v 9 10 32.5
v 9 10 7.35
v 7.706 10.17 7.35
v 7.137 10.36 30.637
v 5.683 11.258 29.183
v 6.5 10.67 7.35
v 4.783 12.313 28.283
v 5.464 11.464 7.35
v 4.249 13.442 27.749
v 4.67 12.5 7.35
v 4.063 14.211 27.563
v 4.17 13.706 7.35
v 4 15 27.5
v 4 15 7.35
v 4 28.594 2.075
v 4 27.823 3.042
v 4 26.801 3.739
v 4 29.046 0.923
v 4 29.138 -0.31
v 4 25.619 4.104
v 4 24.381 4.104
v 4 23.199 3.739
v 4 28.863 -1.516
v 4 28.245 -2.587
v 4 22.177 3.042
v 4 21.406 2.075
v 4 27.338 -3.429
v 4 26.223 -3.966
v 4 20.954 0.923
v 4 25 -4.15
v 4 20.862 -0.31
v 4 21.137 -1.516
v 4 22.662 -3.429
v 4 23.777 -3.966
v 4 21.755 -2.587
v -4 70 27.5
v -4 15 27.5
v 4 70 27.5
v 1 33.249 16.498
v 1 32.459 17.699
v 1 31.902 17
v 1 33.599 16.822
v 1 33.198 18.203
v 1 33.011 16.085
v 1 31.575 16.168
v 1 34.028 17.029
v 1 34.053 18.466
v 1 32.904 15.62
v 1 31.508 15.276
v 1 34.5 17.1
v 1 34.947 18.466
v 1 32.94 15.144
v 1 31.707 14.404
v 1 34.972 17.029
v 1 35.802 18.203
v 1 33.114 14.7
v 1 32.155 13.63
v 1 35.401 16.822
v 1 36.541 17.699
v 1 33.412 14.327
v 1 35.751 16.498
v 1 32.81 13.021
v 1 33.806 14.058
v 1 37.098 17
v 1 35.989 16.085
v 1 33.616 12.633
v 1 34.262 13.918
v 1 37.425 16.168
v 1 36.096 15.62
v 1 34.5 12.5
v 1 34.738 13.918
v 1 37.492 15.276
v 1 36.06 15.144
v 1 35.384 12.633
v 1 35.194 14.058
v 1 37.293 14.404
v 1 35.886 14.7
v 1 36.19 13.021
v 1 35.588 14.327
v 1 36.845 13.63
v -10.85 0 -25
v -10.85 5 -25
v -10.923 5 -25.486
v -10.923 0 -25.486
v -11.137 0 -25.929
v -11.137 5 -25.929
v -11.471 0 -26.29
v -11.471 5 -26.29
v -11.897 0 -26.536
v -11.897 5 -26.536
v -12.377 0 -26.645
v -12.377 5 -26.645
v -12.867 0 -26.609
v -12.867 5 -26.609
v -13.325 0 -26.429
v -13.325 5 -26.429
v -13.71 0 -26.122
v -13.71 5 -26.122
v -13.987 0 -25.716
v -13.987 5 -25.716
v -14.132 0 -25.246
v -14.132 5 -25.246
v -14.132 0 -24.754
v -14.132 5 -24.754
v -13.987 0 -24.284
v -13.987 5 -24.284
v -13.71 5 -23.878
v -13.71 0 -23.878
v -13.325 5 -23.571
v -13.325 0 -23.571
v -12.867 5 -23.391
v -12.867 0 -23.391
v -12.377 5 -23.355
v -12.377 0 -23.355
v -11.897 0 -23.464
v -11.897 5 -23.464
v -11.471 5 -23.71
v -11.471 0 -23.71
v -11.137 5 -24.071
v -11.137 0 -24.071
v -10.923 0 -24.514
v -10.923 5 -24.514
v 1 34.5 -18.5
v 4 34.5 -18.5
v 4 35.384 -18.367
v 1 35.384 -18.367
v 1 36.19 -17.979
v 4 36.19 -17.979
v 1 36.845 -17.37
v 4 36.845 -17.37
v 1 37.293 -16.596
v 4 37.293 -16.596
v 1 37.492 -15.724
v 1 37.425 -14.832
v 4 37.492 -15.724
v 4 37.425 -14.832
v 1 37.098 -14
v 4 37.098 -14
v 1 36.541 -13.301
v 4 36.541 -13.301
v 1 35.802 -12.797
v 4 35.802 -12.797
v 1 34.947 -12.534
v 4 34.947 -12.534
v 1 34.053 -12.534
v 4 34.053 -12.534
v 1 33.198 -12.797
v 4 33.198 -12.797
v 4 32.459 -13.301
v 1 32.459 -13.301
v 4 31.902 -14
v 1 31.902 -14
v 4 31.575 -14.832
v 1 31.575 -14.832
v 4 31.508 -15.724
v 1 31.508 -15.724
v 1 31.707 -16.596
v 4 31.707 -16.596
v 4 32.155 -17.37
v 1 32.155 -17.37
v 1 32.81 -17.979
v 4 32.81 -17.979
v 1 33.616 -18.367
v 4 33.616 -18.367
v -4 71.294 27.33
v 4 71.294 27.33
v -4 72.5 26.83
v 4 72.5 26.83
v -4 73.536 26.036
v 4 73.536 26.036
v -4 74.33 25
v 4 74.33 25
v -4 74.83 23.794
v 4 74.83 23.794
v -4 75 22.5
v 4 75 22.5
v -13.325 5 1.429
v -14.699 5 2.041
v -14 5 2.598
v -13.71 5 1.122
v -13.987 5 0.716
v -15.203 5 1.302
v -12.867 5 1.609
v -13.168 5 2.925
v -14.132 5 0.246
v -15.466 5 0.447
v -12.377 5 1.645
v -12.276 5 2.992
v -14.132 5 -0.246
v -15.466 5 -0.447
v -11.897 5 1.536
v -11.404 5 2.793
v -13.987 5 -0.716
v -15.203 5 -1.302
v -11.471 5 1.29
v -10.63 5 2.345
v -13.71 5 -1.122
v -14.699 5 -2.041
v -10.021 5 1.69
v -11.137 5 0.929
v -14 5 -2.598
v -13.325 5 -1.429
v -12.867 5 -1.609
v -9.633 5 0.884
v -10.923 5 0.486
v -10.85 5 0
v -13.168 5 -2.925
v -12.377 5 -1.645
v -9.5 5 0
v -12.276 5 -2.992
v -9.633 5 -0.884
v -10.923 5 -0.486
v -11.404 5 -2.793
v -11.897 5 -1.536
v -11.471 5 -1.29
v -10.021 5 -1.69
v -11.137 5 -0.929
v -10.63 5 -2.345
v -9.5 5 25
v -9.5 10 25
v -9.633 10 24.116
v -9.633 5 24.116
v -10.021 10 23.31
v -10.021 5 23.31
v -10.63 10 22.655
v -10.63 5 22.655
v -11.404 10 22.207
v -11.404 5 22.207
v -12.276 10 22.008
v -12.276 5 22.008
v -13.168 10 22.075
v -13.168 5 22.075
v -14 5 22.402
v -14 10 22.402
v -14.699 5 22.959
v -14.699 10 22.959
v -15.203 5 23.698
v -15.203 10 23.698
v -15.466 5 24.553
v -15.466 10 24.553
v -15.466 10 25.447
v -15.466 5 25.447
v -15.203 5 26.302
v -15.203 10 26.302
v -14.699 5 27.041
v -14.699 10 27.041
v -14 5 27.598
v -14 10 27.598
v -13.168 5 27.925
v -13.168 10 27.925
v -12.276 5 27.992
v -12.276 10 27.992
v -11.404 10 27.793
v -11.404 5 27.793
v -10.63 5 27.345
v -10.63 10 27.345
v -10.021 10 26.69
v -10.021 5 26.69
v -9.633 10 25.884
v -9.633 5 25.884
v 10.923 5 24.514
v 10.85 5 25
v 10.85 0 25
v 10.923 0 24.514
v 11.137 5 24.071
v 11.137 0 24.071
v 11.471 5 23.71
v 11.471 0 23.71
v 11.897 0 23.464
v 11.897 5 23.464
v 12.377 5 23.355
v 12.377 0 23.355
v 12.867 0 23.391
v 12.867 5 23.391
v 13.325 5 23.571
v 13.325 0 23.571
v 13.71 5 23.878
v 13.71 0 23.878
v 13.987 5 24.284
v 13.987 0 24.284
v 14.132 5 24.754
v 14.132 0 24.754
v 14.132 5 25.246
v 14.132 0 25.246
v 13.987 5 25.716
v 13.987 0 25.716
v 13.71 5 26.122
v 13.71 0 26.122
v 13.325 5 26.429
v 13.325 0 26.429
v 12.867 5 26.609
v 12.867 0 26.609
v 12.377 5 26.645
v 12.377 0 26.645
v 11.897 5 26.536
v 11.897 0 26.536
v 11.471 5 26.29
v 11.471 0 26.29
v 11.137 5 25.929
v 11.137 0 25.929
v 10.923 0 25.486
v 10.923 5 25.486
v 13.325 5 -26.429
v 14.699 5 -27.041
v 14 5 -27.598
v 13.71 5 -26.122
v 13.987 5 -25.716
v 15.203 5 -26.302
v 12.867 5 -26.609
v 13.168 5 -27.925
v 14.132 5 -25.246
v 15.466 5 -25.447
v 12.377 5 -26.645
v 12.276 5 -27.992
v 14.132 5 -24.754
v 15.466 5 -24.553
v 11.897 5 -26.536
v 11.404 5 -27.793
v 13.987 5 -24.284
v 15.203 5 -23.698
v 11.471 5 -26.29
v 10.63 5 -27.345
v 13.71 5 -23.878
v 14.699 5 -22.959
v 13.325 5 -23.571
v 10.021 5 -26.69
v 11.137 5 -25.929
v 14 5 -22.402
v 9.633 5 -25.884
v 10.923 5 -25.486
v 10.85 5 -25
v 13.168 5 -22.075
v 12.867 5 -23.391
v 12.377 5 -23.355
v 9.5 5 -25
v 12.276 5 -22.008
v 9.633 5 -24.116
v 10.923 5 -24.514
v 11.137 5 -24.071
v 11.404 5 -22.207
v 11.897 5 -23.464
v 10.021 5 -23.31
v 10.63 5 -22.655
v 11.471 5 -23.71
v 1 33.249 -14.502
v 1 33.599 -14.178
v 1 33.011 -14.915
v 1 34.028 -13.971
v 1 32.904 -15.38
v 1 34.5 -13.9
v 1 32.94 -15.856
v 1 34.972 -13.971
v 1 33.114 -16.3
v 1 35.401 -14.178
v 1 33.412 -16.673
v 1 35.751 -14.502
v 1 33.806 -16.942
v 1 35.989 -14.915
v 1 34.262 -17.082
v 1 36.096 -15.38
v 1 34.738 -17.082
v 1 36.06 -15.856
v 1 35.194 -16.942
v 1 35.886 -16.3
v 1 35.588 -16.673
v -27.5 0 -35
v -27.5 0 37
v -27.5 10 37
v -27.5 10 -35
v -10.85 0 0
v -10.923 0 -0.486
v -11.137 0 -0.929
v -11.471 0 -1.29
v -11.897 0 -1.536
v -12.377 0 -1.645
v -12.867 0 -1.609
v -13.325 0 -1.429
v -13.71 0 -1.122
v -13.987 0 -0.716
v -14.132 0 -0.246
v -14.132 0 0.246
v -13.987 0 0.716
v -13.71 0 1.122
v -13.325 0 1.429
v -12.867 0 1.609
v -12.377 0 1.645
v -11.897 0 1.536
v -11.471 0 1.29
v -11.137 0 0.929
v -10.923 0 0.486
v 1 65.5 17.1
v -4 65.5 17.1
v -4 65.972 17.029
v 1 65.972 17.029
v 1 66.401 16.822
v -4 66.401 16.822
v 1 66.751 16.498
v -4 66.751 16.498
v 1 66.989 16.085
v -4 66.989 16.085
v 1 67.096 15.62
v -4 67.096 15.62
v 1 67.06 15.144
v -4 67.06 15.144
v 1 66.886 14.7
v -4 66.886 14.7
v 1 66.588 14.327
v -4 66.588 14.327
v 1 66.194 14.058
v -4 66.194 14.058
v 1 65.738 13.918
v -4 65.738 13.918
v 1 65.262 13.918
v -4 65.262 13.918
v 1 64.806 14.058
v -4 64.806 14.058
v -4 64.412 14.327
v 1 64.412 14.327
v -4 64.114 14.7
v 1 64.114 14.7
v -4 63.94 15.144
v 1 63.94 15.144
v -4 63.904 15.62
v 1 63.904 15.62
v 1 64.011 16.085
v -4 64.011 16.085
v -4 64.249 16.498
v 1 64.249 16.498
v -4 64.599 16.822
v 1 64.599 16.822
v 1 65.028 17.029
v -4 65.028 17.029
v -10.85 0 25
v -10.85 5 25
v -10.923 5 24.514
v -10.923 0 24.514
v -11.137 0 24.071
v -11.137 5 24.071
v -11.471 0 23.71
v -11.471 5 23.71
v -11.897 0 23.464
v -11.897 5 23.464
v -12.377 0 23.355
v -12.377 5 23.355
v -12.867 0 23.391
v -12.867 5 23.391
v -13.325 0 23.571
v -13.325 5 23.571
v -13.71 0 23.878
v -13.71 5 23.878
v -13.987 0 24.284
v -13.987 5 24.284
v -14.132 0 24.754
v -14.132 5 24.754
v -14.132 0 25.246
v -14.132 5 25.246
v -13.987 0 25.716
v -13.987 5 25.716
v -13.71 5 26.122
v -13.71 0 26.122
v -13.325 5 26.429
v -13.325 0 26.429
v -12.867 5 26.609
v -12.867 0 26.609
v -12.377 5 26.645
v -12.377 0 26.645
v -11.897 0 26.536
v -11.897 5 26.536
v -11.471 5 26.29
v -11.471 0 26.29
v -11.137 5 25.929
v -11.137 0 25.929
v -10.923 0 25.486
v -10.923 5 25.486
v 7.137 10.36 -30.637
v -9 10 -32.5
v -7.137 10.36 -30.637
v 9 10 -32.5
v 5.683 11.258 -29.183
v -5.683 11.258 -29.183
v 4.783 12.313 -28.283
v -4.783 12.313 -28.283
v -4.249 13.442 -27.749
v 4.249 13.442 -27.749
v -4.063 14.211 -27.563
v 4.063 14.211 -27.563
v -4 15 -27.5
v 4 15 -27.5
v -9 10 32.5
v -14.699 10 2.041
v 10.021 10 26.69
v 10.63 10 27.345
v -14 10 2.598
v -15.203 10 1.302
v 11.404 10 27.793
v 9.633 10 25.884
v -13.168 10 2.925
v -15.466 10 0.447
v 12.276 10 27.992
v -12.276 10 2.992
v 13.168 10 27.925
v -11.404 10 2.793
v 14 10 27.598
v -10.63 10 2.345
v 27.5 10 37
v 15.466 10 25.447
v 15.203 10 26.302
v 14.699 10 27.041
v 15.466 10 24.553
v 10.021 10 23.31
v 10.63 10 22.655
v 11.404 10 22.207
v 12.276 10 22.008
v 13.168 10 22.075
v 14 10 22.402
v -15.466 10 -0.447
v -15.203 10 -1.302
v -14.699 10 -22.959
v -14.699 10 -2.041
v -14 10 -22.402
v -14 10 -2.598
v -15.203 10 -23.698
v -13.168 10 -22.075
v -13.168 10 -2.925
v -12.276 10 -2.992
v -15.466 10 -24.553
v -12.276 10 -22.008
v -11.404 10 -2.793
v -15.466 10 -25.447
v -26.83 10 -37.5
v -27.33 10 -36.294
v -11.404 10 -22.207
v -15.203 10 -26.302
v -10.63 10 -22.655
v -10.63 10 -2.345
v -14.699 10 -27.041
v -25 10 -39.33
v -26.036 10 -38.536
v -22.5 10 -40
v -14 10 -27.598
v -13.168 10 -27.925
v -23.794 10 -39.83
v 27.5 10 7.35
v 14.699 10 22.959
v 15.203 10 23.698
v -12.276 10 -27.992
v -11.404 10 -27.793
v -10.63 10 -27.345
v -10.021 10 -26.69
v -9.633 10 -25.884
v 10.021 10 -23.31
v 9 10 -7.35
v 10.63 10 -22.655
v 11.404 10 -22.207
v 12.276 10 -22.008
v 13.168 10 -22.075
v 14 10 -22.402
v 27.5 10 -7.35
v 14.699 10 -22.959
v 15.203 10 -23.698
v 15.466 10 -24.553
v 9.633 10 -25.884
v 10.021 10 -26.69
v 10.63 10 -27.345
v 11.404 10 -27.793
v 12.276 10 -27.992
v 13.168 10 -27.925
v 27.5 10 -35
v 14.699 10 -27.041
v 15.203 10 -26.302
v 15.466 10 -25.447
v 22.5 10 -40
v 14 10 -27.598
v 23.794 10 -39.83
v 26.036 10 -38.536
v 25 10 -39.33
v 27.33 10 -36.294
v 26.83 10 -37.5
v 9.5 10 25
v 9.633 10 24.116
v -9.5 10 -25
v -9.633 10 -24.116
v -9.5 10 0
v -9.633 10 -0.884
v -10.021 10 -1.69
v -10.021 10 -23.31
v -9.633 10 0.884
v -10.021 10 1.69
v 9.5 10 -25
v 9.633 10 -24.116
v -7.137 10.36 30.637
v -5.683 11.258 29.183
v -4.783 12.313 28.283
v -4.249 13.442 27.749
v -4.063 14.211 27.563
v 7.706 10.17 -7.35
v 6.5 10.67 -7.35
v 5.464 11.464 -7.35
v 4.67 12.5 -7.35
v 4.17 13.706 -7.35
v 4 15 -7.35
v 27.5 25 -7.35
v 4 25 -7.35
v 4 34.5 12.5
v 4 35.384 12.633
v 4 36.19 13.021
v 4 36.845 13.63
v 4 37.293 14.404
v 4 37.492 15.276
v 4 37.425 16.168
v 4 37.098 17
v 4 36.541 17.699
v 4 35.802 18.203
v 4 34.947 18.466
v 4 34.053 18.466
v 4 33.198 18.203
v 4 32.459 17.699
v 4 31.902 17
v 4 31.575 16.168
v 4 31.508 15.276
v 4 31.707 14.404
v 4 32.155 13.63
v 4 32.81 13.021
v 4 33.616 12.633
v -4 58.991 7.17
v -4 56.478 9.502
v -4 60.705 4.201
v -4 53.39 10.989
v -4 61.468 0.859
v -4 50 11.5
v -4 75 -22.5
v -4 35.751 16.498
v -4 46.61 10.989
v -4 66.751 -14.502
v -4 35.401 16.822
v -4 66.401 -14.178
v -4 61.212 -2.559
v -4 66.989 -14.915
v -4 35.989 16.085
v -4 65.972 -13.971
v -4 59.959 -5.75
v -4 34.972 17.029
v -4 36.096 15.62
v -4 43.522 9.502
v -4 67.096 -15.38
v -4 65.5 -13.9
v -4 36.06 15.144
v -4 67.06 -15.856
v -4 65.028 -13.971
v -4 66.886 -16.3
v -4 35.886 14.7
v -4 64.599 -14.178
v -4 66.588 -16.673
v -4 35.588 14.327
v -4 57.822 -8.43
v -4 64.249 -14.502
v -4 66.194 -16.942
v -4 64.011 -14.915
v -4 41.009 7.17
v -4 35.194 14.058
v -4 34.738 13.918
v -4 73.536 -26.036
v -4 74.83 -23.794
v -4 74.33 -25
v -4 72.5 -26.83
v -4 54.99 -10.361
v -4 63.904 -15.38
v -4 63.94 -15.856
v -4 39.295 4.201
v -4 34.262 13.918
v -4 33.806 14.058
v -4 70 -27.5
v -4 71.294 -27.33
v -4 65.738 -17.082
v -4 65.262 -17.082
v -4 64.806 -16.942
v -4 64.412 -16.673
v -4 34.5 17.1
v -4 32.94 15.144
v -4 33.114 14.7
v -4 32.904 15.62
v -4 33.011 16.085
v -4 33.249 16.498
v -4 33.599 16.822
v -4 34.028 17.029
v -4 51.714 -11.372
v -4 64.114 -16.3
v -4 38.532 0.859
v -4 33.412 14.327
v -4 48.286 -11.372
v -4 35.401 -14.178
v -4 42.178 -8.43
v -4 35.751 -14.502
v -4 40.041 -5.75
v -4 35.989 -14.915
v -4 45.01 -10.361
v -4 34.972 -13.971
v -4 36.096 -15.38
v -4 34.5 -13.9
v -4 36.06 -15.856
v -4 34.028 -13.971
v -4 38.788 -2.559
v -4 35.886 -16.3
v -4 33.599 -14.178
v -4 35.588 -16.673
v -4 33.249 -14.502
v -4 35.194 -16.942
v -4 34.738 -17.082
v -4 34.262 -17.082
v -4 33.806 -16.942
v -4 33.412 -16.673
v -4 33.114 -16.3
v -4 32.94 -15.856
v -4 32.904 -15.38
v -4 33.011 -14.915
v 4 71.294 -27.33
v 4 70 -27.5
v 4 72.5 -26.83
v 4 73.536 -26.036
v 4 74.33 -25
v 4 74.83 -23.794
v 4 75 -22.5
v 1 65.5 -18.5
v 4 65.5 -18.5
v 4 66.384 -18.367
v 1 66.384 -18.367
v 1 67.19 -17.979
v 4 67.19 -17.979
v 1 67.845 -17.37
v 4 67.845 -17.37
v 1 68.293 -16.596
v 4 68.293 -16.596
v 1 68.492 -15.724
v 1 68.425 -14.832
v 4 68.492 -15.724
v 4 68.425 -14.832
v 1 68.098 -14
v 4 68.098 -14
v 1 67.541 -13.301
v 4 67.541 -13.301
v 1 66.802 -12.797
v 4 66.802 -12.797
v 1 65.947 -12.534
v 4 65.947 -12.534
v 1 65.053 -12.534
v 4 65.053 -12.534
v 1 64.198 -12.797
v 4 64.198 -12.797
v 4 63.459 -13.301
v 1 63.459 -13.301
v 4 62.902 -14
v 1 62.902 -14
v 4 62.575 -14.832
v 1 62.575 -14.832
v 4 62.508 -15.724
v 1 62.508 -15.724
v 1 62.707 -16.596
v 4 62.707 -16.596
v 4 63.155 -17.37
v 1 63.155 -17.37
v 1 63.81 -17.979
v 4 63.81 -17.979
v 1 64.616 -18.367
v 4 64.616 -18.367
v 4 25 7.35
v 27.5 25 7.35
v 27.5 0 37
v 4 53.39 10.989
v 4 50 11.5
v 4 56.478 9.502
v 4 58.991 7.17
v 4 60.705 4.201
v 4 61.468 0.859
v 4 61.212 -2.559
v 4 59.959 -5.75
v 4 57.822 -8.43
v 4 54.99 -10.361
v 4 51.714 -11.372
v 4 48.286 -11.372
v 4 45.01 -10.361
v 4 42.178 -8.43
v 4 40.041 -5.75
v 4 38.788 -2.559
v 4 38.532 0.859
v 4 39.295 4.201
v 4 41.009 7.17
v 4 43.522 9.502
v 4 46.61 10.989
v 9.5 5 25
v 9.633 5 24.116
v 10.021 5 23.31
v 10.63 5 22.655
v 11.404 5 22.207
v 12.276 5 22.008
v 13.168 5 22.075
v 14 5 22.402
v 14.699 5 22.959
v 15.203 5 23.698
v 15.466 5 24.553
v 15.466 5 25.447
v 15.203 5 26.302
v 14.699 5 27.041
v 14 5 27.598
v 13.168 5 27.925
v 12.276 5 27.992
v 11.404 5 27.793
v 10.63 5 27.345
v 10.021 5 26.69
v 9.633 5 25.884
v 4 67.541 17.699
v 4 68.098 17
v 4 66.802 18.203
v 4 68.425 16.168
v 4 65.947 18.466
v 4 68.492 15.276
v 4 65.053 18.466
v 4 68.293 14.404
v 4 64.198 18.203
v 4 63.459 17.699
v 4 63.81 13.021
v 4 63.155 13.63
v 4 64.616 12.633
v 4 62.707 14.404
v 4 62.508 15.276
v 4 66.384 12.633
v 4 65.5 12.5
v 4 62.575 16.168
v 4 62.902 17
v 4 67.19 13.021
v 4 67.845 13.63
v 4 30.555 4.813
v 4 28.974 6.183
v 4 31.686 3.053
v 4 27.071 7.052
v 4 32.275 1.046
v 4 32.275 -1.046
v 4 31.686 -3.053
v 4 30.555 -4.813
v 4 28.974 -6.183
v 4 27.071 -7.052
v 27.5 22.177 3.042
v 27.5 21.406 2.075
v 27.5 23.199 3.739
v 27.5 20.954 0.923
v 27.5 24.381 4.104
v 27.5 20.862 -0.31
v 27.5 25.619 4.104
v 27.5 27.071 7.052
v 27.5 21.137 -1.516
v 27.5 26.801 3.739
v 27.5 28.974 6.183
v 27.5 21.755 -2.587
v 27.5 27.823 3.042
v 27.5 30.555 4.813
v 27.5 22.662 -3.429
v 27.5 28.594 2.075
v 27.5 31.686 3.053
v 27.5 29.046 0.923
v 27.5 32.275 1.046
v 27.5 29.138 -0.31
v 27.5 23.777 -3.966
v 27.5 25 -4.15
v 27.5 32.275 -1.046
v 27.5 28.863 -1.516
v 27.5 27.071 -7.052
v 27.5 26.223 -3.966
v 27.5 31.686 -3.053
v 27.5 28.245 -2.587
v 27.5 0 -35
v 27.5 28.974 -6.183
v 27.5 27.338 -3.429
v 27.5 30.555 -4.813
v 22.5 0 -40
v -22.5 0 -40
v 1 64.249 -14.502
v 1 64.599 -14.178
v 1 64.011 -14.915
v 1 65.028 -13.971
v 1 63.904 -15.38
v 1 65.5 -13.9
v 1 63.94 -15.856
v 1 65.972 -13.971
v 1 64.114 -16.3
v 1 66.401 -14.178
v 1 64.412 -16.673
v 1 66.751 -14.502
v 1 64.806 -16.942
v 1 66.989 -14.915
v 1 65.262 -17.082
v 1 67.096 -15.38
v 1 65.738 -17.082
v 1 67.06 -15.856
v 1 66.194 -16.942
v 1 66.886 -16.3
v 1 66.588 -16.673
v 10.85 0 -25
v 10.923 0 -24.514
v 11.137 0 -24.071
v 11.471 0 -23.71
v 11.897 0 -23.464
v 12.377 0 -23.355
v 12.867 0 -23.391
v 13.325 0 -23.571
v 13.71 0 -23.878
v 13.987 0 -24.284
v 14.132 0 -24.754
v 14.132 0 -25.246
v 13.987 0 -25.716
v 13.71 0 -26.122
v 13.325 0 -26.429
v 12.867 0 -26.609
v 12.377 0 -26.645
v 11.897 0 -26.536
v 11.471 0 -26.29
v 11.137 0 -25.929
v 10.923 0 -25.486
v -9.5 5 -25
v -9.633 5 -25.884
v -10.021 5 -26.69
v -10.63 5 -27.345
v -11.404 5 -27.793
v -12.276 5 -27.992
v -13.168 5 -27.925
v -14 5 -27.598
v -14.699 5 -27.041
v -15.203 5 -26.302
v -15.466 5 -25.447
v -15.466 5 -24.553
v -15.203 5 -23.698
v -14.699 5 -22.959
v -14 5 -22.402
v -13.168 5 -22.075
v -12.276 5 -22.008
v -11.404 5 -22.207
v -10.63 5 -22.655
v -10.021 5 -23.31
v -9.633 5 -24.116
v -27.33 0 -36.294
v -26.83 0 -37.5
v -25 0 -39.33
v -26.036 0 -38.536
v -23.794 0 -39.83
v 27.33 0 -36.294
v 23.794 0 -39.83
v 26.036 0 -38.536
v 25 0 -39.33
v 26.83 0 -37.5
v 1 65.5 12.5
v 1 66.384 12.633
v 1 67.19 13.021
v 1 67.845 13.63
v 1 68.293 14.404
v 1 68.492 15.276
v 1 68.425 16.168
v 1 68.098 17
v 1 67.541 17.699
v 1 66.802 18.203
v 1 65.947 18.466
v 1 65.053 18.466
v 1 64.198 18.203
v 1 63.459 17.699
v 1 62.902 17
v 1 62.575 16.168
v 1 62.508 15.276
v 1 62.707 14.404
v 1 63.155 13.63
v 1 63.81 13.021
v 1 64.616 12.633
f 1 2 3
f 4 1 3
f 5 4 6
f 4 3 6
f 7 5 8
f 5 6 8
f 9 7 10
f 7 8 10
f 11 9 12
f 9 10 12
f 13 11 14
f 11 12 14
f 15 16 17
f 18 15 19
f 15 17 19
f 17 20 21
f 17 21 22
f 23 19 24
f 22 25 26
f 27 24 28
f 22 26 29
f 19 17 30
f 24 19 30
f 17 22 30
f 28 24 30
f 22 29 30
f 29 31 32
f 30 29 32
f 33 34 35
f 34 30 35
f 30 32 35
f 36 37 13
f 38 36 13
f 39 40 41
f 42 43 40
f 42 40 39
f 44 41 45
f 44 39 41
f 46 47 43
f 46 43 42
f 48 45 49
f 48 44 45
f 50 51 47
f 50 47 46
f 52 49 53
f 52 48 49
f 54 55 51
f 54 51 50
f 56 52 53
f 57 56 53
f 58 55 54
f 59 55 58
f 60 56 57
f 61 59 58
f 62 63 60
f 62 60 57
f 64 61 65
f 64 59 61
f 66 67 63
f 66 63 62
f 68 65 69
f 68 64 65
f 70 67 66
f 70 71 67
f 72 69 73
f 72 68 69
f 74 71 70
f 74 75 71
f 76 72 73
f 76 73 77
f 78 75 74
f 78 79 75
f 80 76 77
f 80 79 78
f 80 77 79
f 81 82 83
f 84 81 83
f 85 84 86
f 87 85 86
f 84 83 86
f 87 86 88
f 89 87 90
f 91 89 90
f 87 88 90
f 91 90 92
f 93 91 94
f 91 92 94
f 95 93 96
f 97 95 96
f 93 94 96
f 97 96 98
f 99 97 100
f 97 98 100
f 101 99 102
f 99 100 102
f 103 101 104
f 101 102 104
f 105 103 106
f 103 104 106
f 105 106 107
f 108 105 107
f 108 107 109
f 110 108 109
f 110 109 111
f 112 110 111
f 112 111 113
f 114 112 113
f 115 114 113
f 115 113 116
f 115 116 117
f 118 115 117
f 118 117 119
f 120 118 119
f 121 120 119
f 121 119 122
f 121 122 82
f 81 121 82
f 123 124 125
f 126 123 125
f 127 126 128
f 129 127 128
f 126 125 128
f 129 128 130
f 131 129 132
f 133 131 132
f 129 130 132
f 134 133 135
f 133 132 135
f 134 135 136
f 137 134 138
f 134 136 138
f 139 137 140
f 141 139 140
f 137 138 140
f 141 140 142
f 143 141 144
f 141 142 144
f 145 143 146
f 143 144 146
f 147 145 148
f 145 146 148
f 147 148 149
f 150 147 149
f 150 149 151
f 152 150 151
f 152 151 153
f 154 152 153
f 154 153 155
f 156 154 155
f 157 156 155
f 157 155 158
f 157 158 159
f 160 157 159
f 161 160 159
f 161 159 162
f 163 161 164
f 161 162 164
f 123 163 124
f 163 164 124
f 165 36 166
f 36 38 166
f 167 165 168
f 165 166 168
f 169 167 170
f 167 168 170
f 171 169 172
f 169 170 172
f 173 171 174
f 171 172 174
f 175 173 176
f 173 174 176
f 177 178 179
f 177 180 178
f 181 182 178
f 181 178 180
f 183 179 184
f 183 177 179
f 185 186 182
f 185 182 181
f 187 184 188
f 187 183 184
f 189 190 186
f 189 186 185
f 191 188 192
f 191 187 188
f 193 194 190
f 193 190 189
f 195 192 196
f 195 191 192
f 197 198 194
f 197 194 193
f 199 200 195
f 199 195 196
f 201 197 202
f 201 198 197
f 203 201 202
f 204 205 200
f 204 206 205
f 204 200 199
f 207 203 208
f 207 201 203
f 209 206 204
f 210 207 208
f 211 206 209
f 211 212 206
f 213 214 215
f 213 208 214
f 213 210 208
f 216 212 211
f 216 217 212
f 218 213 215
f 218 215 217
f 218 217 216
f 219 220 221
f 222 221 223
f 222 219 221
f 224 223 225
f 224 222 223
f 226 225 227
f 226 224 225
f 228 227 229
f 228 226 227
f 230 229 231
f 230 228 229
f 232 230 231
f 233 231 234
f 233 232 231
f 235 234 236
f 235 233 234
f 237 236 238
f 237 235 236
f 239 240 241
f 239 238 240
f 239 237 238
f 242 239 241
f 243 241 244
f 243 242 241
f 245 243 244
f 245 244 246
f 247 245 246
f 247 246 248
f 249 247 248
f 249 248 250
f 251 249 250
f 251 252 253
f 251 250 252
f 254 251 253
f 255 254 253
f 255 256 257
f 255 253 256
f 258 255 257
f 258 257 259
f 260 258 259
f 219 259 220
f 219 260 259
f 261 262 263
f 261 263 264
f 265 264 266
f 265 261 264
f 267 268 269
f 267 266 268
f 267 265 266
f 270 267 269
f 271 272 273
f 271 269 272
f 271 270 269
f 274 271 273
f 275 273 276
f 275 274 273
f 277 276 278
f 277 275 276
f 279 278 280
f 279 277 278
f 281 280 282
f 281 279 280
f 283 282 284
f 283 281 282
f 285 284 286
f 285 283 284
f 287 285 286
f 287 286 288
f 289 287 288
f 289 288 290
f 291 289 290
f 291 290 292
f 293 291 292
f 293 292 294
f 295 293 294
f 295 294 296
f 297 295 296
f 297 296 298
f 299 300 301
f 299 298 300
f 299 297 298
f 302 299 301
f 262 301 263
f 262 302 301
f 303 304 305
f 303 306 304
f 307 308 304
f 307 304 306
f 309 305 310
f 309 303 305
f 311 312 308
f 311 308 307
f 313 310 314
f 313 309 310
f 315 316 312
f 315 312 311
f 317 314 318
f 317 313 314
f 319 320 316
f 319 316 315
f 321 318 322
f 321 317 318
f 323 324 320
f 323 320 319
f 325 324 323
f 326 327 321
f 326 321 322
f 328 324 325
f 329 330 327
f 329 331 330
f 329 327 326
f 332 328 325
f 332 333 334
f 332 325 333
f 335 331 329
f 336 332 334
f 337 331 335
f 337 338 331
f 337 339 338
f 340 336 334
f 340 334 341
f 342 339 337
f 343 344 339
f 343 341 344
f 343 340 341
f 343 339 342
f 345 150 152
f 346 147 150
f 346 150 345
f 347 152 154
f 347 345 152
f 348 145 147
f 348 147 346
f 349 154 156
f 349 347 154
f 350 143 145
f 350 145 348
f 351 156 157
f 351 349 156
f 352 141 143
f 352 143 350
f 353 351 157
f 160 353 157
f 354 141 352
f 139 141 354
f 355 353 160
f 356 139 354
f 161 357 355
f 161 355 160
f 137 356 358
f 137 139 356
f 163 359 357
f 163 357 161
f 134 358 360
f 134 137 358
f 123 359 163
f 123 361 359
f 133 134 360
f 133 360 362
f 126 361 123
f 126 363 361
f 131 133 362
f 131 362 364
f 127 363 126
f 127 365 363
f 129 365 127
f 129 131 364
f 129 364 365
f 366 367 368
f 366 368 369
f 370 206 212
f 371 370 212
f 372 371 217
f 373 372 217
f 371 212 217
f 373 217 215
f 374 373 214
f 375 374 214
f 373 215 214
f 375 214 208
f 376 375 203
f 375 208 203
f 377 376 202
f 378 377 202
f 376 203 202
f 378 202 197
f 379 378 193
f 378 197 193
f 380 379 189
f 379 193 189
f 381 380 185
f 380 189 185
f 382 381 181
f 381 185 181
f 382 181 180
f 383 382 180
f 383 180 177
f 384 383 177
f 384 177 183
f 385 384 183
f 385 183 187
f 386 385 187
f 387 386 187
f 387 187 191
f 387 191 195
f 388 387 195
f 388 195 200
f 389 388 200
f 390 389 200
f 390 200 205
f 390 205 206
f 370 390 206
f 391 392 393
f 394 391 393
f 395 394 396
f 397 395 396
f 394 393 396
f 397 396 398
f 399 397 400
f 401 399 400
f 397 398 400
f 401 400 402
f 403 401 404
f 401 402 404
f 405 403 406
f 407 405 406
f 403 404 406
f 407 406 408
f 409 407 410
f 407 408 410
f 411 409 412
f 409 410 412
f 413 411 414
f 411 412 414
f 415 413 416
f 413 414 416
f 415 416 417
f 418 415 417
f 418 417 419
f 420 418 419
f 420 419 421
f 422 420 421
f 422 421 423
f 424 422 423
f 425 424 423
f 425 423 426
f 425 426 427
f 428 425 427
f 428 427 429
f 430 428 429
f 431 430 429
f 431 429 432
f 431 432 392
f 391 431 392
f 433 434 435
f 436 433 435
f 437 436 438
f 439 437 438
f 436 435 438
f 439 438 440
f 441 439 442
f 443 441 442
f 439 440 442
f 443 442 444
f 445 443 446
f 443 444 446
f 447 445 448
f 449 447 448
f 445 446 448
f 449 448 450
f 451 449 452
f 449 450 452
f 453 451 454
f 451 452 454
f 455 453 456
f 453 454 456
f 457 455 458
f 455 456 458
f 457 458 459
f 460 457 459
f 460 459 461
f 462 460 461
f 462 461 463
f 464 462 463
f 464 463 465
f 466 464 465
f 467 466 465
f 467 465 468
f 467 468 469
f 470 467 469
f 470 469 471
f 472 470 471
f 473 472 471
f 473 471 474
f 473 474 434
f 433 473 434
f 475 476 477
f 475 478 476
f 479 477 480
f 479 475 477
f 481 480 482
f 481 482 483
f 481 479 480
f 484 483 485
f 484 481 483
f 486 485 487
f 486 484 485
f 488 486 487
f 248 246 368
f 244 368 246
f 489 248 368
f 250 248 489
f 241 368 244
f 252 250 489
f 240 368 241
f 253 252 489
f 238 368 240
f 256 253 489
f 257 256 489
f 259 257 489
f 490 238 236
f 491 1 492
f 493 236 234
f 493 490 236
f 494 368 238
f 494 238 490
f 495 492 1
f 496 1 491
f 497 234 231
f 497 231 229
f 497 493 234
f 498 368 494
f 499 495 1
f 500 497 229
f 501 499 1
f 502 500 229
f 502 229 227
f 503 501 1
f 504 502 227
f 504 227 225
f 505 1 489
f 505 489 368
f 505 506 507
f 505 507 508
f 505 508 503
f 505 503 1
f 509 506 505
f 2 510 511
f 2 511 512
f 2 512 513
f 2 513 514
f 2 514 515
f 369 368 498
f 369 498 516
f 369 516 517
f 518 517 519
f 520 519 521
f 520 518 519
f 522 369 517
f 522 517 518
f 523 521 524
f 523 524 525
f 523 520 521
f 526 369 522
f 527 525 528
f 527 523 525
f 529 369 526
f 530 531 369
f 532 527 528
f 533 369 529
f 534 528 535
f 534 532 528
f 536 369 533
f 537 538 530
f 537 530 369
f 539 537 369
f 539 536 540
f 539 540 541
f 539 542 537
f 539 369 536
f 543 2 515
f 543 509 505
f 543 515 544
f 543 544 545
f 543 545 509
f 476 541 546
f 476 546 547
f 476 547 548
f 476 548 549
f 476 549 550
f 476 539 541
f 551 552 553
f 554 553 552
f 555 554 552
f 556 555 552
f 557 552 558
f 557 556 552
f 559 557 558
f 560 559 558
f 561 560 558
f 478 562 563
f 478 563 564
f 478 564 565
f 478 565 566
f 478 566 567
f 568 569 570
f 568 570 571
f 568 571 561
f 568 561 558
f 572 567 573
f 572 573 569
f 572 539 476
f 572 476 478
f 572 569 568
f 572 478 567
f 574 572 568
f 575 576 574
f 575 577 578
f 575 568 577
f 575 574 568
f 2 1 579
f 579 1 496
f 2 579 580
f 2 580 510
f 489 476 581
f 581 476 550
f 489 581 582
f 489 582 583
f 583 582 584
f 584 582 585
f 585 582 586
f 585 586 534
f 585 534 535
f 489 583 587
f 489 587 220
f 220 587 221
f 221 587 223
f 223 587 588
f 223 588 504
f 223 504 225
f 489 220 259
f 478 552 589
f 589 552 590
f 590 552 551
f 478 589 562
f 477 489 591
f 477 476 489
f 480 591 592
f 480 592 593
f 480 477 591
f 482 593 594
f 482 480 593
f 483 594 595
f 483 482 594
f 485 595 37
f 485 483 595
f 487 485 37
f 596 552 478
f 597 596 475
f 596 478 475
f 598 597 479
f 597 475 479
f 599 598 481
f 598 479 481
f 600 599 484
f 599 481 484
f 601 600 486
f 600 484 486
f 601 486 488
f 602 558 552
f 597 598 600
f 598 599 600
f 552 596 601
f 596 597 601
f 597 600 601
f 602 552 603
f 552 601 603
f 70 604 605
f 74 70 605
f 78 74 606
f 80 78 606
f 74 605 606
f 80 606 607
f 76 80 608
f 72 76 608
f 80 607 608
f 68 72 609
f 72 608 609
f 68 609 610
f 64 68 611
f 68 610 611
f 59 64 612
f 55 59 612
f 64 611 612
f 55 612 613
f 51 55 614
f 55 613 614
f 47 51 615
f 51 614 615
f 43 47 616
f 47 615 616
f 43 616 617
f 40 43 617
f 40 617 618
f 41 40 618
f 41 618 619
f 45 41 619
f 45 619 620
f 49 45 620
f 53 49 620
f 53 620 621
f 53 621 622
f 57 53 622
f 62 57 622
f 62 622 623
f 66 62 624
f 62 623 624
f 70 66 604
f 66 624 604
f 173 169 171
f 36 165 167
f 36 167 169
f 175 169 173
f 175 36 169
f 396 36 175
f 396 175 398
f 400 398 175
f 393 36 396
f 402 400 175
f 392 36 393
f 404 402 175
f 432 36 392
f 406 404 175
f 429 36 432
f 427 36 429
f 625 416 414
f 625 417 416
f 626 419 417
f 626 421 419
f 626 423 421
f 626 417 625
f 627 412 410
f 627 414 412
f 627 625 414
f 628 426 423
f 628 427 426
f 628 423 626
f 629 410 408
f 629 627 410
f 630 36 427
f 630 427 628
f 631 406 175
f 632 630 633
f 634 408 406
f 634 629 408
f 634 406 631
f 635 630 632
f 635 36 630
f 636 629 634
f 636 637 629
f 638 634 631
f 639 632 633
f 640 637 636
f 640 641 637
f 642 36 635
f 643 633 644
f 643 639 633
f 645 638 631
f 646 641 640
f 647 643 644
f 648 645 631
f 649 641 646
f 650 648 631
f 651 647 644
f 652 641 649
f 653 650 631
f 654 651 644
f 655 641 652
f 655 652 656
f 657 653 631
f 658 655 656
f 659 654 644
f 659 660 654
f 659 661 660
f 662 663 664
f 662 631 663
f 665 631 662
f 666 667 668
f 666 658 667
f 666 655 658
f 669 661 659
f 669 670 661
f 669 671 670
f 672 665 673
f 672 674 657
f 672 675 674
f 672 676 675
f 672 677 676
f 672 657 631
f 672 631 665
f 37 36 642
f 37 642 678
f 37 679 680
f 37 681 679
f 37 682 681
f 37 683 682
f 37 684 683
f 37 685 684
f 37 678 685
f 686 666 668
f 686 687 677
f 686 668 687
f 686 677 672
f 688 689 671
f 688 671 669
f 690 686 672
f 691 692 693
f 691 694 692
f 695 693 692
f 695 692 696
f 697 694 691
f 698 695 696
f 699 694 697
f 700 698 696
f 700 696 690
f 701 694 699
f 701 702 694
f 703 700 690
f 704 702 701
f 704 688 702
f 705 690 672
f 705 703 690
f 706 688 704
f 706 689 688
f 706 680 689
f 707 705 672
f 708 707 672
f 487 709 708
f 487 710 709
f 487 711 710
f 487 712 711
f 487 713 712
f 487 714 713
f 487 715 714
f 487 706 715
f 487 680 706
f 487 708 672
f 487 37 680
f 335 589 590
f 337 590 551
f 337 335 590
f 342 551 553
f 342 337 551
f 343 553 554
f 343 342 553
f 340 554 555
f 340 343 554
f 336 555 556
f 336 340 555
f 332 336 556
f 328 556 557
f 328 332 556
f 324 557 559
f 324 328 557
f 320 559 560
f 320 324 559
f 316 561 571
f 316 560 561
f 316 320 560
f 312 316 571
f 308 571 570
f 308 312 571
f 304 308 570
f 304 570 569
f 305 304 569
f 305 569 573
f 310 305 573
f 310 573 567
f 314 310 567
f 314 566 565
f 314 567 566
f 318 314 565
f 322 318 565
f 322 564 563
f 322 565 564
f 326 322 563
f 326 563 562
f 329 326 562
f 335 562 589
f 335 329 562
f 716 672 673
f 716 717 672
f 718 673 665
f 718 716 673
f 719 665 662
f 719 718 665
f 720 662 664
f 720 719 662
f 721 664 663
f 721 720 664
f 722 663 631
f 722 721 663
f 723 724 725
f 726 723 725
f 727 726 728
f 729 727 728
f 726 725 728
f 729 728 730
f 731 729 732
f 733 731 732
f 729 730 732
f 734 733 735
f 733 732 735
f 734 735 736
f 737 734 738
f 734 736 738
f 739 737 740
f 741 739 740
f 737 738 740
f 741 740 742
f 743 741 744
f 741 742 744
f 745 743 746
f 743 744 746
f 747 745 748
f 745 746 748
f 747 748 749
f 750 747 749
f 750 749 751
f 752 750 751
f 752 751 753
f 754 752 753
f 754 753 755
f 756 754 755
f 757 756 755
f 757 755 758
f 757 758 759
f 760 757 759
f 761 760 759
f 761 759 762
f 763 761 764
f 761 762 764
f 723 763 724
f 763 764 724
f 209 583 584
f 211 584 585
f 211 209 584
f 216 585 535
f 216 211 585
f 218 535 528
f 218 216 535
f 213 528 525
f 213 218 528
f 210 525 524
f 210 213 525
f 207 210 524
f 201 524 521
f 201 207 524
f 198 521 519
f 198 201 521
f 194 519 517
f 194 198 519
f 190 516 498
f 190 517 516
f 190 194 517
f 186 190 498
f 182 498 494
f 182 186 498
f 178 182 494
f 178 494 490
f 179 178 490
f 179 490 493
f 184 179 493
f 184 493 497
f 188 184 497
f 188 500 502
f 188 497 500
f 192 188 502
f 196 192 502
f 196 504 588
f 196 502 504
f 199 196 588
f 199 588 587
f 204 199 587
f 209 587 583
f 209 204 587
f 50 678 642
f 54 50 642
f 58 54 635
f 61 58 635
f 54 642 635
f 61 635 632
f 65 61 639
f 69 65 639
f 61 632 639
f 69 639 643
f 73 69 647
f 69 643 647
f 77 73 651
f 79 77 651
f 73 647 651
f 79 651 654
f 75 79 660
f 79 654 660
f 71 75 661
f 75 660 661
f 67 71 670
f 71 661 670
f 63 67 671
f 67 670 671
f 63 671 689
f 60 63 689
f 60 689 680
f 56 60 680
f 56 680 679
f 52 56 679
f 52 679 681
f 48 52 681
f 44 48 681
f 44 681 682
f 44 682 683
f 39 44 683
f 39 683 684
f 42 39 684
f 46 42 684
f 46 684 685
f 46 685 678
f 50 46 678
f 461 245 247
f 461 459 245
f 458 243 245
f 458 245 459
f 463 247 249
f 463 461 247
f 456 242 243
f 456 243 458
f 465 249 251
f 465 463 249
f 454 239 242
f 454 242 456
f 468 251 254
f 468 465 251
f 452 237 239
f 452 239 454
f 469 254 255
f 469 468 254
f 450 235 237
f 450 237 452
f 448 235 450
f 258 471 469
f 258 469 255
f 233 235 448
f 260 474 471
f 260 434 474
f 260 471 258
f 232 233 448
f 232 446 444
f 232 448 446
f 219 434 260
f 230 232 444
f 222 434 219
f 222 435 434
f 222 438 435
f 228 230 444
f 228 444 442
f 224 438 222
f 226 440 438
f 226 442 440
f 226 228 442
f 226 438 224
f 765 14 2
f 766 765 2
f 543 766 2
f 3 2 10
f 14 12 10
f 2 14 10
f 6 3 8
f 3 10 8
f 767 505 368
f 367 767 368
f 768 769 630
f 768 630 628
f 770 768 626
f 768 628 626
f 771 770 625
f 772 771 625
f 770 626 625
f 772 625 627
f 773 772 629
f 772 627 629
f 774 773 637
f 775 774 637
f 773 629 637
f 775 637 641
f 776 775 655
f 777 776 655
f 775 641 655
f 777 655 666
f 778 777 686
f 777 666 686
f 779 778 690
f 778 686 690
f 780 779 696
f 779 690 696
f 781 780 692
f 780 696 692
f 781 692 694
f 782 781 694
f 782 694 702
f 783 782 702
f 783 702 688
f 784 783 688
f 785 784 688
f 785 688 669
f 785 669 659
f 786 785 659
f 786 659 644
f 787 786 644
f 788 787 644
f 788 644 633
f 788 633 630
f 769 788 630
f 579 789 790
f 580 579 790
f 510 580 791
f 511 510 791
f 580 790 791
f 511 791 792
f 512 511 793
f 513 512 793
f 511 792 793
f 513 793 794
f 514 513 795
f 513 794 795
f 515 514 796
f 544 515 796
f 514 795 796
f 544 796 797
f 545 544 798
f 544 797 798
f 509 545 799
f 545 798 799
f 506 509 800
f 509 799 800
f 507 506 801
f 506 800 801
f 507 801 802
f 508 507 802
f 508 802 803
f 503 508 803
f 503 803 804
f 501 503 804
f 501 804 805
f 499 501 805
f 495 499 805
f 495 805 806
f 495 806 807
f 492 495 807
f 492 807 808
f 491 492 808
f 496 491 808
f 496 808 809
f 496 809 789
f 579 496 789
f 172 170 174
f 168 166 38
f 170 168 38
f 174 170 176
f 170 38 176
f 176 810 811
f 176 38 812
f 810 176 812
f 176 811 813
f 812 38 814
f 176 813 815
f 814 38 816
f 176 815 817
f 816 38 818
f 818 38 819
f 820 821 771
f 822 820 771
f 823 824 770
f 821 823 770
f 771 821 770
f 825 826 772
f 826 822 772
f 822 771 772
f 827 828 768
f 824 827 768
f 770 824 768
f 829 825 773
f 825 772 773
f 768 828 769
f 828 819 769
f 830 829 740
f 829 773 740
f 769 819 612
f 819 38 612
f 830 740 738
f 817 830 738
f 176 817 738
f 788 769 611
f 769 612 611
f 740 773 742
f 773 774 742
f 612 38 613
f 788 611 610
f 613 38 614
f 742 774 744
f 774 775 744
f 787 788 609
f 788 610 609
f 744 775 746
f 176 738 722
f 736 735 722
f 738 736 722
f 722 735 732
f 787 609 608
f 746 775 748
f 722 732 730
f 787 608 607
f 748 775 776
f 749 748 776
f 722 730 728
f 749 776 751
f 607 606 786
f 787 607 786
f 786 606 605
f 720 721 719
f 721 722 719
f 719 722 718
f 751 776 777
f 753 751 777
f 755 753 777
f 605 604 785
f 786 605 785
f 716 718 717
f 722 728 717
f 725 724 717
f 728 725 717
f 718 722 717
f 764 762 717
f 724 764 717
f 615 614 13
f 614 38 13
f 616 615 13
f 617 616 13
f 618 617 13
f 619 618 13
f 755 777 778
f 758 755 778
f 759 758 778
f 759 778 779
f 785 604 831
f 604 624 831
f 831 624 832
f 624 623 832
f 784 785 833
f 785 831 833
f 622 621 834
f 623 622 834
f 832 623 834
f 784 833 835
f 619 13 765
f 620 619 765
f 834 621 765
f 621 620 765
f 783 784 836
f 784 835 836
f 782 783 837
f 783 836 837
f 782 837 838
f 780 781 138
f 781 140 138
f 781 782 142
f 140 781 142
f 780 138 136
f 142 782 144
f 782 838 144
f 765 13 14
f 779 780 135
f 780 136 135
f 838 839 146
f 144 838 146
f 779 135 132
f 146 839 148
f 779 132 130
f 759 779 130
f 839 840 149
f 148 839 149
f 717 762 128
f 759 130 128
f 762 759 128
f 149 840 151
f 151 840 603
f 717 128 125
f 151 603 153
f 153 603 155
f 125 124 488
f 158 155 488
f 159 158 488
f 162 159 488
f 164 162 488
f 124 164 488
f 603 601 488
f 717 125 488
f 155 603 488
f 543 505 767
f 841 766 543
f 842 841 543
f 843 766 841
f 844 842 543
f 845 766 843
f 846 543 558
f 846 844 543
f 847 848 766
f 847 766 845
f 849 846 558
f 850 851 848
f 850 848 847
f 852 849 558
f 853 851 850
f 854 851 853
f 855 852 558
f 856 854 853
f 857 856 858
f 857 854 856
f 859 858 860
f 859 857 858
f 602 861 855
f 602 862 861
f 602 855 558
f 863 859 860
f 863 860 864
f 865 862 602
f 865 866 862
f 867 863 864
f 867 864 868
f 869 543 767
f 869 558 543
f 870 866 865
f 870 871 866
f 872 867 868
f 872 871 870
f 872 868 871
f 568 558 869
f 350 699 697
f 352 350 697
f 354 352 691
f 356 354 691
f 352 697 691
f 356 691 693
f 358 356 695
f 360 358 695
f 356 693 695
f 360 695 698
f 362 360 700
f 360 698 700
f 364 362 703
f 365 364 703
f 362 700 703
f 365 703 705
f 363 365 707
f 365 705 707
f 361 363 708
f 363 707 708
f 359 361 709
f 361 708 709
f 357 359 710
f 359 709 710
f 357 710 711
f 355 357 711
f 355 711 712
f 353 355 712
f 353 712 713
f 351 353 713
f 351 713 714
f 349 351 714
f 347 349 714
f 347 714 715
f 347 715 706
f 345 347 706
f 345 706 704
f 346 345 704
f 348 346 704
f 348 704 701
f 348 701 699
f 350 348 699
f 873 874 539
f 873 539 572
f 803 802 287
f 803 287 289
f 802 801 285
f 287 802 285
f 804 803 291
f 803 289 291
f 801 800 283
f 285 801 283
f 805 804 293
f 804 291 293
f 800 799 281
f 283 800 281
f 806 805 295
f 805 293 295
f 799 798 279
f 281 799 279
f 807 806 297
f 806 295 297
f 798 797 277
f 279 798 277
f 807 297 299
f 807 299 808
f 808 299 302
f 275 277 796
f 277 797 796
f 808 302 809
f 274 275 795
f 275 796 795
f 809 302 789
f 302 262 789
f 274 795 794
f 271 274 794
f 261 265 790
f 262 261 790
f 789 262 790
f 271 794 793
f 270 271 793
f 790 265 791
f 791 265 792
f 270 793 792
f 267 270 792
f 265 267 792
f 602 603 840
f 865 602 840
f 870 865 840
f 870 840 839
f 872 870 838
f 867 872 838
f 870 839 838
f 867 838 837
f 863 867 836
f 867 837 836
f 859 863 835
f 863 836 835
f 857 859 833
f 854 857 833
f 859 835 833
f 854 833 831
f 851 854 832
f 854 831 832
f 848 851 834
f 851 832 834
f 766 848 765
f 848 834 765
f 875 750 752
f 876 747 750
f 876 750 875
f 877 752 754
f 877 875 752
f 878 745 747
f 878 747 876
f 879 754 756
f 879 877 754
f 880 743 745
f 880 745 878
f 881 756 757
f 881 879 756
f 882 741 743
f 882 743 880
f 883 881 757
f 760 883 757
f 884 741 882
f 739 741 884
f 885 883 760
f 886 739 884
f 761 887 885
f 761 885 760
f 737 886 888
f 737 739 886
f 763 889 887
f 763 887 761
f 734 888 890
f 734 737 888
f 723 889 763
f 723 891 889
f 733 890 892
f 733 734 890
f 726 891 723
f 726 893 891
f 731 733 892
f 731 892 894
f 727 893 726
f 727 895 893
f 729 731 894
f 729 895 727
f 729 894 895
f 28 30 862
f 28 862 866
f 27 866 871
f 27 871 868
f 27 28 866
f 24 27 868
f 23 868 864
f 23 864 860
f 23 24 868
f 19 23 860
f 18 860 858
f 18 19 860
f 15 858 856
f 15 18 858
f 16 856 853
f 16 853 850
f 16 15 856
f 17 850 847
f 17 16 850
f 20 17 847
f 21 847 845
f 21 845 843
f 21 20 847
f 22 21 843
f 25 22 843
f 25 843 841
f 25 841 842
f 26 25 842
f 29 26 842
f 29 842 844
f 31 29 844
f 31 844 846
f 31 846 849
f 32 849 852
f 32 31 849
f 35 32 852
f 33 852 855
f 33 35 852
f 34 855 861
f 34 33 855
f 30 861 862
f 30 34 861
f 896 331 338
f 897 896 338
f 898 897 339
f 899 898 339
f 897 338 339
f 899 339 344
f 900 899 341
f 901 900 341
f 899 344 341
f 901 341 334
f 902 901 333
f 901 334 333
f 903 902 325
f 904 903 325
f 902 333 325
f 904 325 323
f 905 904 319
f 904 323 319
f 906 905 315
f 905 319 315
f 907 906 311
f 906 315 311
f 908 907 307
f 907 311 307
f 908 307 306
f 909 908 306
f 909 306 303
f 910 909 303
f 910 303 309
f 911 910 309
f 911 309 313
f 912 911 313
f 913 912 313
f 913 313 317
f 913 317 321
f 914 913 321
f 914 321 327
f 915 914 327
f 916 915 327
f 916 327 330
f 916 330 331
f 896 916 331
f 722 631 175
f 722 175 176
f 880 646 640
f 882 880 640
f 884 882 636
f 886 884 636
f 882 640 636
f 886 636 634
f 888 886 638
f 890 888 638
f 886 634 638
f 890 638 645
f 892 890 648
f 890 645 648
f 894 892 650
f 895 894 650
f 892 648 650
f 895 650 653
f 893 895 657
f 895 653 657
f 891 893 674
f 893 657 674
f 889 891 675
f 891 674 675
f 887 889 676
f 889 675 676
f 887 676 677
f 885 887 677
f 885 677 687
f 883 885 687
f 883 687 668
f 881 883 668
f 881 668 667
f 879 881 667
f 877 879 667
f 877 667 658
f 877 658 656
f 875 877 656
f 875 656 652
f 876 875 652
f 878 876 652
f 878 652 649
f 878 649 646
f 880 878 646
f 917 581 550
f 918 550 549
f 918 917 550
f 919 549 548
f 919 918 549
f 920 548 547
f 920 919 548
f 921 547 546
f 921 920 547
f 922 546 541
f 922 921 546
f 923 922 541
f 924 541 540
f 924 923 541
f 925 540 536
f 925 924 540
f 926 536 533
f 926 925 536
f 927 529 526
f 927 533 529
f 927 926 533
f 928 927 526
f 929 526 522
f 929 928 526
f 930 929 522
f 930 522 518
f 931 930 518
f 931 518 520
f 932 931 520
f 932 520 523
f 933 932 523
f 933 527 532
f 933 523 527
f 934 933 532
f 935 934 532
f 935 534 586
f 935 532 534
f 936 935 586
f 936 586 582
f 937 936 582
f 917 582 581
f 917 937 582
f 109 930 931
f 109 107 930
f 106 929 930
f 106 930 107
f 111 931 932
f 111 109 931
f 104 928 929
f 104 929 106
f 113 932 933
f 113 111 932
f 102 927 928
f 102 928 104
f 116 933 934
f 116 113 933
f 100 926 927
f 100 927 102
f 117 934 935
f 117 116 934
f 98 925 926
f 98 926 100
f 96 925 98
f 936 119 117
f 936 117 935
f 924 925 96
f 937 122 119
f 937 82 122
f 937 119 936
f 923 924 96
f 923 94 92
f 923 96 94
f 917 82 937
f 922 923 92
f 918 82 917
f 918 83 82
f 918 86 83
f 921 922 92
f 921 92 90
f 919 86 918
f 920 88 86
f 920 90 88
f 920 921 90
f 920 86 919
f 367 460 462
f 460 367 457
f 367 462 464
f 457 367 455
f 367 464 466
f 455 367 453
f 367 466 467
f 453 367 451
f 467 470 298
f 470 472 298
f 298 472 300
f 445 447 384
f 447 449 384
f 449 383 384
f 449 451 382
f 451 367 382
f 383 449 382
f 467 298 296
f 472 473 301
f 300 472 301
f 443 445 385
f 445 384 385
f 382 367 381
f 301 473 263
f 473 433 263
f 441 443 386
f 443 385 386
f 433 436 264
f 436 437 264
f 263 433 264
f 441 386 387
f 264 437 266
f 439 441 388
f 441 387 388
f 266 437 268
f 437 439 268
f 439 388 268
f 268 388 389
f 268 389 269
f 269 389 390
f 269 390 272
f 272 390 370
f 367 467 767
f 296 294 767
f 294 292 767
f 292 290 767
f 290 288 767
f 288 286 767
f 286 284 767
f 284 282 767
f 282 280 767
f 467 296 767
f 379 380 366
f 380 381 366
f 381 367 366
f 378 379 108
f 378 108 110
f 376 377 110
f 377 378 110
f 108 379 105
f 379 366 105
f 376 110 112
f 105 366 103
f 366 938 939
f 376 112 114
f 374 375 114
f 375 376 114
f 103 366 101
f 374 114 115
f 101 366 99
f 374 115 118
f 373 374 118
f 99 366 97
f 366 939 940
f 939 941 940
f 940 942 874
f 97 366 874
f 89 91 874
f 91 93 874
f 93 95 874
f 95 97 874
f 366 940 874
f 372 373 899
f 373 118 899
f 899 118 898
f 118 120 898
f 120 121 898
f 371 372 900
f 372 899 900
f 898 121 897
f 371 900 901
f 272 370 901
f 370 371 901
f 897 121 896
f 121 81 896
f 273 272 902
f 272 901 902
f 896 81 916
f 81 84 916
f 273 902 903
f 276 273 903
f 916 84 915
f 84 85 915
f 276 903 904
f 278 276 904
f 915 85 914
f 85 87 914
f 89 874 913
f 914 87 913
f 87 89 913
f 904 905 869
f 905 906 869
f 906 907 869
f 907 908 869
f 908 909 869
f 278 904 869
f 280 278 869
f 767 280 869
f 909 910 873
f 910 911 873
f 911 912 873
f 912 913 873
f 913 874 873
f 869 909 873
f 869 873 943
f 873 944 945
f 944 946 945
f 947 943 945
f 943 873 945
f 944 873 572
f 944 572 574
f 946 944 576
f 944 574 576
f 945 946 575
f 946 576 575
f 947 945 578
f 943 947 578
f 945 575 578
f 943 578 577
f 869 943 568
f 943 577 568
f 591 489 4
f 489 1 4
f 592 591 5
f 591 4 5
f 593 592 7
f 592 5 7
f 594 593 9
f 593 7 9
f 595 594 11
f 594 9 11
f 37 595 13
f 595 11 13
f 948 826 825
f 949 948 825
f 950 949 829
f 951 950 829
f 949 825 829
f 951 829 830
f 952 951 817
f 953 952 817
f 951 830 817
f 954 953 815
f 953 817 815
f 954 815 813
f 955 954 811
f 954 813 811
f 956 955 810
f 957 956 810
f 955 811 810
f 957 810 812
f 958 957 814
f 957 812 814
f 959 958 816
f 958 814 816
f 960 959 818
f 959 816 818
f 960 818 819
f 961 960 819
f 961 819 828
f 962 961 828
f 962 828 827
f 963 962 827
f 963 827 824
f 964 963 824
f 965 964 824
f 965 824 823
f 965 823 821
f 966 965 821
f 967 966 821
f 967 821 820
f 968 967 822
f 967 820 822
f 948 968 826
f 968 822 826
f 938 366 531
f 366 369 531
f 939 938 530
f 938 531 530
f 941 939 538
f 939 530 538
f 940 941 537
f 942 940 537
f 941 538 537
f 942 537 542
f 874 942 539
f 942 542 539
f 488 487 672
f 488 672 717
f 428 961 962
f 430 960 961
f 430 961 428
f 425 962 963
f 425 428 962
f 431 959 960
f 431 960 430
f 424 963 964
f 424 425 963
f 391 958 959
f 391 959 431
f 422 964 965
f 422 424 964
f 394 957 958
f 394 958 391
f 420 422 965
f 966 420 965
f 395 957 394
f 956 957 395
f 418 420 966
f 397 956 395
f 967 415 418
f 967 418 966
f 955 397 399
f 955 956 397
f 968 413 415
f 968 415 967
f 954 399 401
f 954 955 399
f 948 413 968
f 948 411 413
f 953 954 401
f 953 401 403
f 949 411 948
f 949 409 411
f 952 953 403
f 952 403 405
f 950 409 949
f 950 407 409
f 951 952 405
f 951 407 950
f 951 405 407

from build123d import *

# Parameters (mm, degrees)
SKETCH1_W               = 55
SKETCH1_H               = 80
BOSS_EXTRUDE1_DEPTH     = 10
SKETCH6_R               = 1.65
CUT_EXTRUDE2_DEPTH      = 55
LPATTERN1_COUNT         = 3
LPATTERN1_PITCH         = 25
MIRROR3_COPY_1_SKETCH_R = 1.65
MIRROR3_COPY_1_DEPTH    = 55
MIRROR3_COPY_2_SKETCH_R = 1.65
MIRROR3_COPY_2_DEPTH    = 55
SKETCH8_W               = 8
SKETCH8_H               = 55
BOSS_EXTRUDE3_DEPTH     = 65
FILLET3_R               = 5
SKETCH9_R               = 1.6
SKETCH9_R_2             = 11.5
CUT_EXTRUDE3_DEPTH      = 32.5
SKETCH10_R              = 3
CUT_EXTRUDE4_DEPTH      = 3
CUT_EXTRUDE5_START      = -5
SKETCH11_R              = 3
CUT_EXTRUDE5_DEPTH      = 71
LPATTERN2_COUNT         = 3
LPATTERN2_PITCH         = 25
MIRROR4_START           = -5
MIRROR4_COPY_1_SKETCH_R = 3
MIRROR4_COPY_1_DEPTH    = 71
MIRROR4_COPY_2_SKETCH_R = 3
MIRROR4_COPY_2_DEPTH    = 71
CUT_EXTRUDE6_DEPTH      = 10
SKETCH13_R              = 4.15
BOSS_EXTRUDE4_DEPTH     = 23.5


with BuildPart() as part:
    # Sketch1 → Boss-Extrude1 (new body)
    with BuildSketch(Plane(origin=(0, 0, 0), x_dir=(1, 0, 0), z_dir=(0, 1, 0))):
        Rectangle(SKETCH1_W, SKETCH1_H)
    extrude(amount=BOSS_EXTRUDE1_DEPTH)

    # Sketch6 → Cut-Extrude2 (cut)
    with BuildSketch(Plane(origin=(0, 10, 0), x_dir=(1, 0, 0), z_dir=(0, 1, 0))):
        with Locations((-12.5, -25)):
            Circle(SKETCH6_R)
    cut_extrude2 = extrude(amount=-CUT_EXTRUDE2_DEPTH, mode=Mode.SUBTRACT)

    # LPattern1: Cut-Extrude2 ×3
    with Locations(*[(0, 0, -i * LPATTERN1_PITCH) for i in range(1, LPATTERN1_COUNT)]):
        add(cut_extrude2, mode=Mode.SUBTRACT)

    # Mirror3: Cut-Extrude2 across plane
    add(cut_extrude2.mirror(Plane(origin=(0, 0, 0), x_dir=(0, 0, 1), z_dir=(1, 0, 0))), mode=Mode.SUBTRACT)

    # Mirror3 copy 1 sketch → Mirror3 copy 1 (cut)
    with BuildSketch(Plane(origin=(0, 10, -25), x_dir=(-1, 0, 0), z_dir=(0, 1, 0))):
        with Locations((-12.5, 25)):
            Circle(MIRROR3_COPY_1_SKETCH_R)
    extrude(amount=-MIRROR3_COPY_1_DEPTH, mode=Mode.SUBTRACT)

    # Mirror3 copy 2 sketch → Mirror3 copy 2 (cut)
    with BuildSketch(Plane(origin=(0, 10, -50), x_dir=(-1, 0, 0), z_dir=(0, 1, 0))):
        with Locations((-12.5, 25)):
            Circle(MIRROR3_COPY_2_SKETCH_R)
    extrude(amount=-MIRROR3_COPY_2_DEPTH, mode=Mode.SUBTRACT)

    # Sketch8 → Boss-Extrude3 (add)
    with BuildSketch(Plane(origin=(0, 10, 0), x_dir=(1, 0, 0), z_dir=(0, 1, 0))):
        Rectangle(SKETCH8_W, SKETCH8_H)
    extrude(amount=BOSS_EXTRUDE3_DEPTH)

    # Fillet3
    fillet3_edges = [part.edges().sort_by_distance(p)[0] for p in [
        (4, 10, 0),
        (0, 10, -27.5),
        (-4, 10, 0),
        (0, 10, 27.5),
        (0, 75, -27.5),
        (0, 75, 27.5),
        (-27.5, 5, -40),
        (27.5, 5, -40),
    ]]
    fillet(fillet3_edges, radius=FILLET3_R)

    # Sketch9 → Cut-Extrude3 (cut, through all)
    with BuildSketch(Plane.ZY.offset(4)):
        with Locations((-15.5, 65.5)):
            Circle(SKETCH9_R)
        with Locations((15.5, 65.5)):
            Circle(SKETCH9_R)
        with Locations((-15.5, 34.5)):
            Circle(SKETCH9_R)
        with Locations((15.5, 34.5)):
            Circle(SKETCH9_R)
        with Locations((0, 50)):
            Circle(SKETCH9_R_2)
    extrude(amount=-CUT_EXTRUDE3_DEPTH, mode=Mode.SUBTRACT)

    # Sketch10 → Cut-Extrude4 (cut)
    with BuildSketch(Plane(origin=(4, 0, 0), x_dir=(0, 0, -1), z_dir=(1, 0, 0))):
        with Locations((-15.5, 65.5)):
            Circle(SKETCH10_R)
        with Locations((15.5, 65.5)):
            Circle(SKETCH10_R)
        with Locations((15.5, 34.5)):
            Circle(SKETCH10_R)
        with Locations((-15.5, 34.5)):
            Circle(SKETCH10_R)
    extrude(amount=-CUT_EXTRUDE4_DEPTH, mode=Mode.SUBTRACT)

    # Sketch11 → Cut-Extrude5 (cut)
    with BuildSketch(Plane(origin=(0, 10, 0), x_dir=(1, 0, 0), z_dir=(0, 1, 0)).offset(CUT_EXTRUDE5_START)):
        with Locations((-12.5, -25)):
            Circle(SKETCH11_R)
    cut_extrude5 = extrude(amount=CUT_EXTRUDE5_DEPTH, mode=Mode.SUBTRACT)

    # LPattern2: Cut-Extrude5 ×3
    with Locations(*[(0, 0, -i * LPATTERN2_PITCH) for i in range(1, LPATTERN2_COUNT)]):
        add(cut_extrude5, mode=Mode.SUBTRACT)

    # Mirror4: Cut-Extrude5 across plane
    add(cut_extrude5.mirror(Plane(origin=(0, 0, 0), x_dir=(0, 0, 1), z_dir=(1, 0, 0))), mode=Mode.SUBTRACT)

    # Mirror4 copy 1 sketch → Mirror4 copy 1 (cut)
    with BuildSketch(Plane(origin=(0, 10, -25), x_dir=(-1, 0, 0), z_dir=(0, 1, 0)).offset(MIRROR4_START)):
        with Locations((-12.5, 25)):
            Circle(MIRROR4_COPY_1_SKETCH_R)
    extrude(amount=MIRROR4_COPY_1_DEPTH, mode=Mode.SUBTRACT)

    # Mirror4 copy 2 sketch → Mirror4 copy 2 (cut)
    with BuildSketch(Plane(origin=(0, 10, -50), x_dir=(-1, 0, 0), z_dir=(0, 1, 0)).offset(MIRROR4_START)):
        with Locations((-12.5, 25)):
            Circle(MIRROR4_COPY_2_SKETCH_R)
    extrude(amount=MIRROR4_COPY_2_DEPTH, mode=Mode.SUBTRACT)

    # Sketch12 → Cut-Extrude6 (cut)
    with BuildSketch(Plane(origin=(0, 10, 0), x_dir=(1, 0, 0), z_dir=(0, 1, 0))):
        Polygon((12.5, -37), (-38.055736231, -37), (-38.055736231, -44.287300659), (40.369344369, -44.287300659), (40.369344369, -37), align=None)
    extrude(amount=-CUT_EXTRUDE6_DEPTH, mode=Mode.SUBTRACT)

    # Sketch13 → Boss-Extrude4 (add)
    with BuildSketch(Plane(origin=(4, 0, 0), x_dir=(0, 0, -1), z_dir=(1, 0, 0))):
        with BuildLine():
            Line((-7.35, 25), (-7.35, 10))
            Line((-7.35, 10), (-7.35, 0))
            Line((-7.35, 0), (7.35, 0))
            Line((7.35, 0), (7.35, 10))
            Line((7.35, 10), (7.35, 25))
            ThreePointArc((7.35, 25), (0, 32.35), (-7.35, 25))
        make_face()
        with Locations((0, 25)):
            Circle(SKETCH13_R, mode=Mode.SUBTRACT)
    extrude(amount=BOSS_EXTRUDE4_DEPTH)


solid = part.part
